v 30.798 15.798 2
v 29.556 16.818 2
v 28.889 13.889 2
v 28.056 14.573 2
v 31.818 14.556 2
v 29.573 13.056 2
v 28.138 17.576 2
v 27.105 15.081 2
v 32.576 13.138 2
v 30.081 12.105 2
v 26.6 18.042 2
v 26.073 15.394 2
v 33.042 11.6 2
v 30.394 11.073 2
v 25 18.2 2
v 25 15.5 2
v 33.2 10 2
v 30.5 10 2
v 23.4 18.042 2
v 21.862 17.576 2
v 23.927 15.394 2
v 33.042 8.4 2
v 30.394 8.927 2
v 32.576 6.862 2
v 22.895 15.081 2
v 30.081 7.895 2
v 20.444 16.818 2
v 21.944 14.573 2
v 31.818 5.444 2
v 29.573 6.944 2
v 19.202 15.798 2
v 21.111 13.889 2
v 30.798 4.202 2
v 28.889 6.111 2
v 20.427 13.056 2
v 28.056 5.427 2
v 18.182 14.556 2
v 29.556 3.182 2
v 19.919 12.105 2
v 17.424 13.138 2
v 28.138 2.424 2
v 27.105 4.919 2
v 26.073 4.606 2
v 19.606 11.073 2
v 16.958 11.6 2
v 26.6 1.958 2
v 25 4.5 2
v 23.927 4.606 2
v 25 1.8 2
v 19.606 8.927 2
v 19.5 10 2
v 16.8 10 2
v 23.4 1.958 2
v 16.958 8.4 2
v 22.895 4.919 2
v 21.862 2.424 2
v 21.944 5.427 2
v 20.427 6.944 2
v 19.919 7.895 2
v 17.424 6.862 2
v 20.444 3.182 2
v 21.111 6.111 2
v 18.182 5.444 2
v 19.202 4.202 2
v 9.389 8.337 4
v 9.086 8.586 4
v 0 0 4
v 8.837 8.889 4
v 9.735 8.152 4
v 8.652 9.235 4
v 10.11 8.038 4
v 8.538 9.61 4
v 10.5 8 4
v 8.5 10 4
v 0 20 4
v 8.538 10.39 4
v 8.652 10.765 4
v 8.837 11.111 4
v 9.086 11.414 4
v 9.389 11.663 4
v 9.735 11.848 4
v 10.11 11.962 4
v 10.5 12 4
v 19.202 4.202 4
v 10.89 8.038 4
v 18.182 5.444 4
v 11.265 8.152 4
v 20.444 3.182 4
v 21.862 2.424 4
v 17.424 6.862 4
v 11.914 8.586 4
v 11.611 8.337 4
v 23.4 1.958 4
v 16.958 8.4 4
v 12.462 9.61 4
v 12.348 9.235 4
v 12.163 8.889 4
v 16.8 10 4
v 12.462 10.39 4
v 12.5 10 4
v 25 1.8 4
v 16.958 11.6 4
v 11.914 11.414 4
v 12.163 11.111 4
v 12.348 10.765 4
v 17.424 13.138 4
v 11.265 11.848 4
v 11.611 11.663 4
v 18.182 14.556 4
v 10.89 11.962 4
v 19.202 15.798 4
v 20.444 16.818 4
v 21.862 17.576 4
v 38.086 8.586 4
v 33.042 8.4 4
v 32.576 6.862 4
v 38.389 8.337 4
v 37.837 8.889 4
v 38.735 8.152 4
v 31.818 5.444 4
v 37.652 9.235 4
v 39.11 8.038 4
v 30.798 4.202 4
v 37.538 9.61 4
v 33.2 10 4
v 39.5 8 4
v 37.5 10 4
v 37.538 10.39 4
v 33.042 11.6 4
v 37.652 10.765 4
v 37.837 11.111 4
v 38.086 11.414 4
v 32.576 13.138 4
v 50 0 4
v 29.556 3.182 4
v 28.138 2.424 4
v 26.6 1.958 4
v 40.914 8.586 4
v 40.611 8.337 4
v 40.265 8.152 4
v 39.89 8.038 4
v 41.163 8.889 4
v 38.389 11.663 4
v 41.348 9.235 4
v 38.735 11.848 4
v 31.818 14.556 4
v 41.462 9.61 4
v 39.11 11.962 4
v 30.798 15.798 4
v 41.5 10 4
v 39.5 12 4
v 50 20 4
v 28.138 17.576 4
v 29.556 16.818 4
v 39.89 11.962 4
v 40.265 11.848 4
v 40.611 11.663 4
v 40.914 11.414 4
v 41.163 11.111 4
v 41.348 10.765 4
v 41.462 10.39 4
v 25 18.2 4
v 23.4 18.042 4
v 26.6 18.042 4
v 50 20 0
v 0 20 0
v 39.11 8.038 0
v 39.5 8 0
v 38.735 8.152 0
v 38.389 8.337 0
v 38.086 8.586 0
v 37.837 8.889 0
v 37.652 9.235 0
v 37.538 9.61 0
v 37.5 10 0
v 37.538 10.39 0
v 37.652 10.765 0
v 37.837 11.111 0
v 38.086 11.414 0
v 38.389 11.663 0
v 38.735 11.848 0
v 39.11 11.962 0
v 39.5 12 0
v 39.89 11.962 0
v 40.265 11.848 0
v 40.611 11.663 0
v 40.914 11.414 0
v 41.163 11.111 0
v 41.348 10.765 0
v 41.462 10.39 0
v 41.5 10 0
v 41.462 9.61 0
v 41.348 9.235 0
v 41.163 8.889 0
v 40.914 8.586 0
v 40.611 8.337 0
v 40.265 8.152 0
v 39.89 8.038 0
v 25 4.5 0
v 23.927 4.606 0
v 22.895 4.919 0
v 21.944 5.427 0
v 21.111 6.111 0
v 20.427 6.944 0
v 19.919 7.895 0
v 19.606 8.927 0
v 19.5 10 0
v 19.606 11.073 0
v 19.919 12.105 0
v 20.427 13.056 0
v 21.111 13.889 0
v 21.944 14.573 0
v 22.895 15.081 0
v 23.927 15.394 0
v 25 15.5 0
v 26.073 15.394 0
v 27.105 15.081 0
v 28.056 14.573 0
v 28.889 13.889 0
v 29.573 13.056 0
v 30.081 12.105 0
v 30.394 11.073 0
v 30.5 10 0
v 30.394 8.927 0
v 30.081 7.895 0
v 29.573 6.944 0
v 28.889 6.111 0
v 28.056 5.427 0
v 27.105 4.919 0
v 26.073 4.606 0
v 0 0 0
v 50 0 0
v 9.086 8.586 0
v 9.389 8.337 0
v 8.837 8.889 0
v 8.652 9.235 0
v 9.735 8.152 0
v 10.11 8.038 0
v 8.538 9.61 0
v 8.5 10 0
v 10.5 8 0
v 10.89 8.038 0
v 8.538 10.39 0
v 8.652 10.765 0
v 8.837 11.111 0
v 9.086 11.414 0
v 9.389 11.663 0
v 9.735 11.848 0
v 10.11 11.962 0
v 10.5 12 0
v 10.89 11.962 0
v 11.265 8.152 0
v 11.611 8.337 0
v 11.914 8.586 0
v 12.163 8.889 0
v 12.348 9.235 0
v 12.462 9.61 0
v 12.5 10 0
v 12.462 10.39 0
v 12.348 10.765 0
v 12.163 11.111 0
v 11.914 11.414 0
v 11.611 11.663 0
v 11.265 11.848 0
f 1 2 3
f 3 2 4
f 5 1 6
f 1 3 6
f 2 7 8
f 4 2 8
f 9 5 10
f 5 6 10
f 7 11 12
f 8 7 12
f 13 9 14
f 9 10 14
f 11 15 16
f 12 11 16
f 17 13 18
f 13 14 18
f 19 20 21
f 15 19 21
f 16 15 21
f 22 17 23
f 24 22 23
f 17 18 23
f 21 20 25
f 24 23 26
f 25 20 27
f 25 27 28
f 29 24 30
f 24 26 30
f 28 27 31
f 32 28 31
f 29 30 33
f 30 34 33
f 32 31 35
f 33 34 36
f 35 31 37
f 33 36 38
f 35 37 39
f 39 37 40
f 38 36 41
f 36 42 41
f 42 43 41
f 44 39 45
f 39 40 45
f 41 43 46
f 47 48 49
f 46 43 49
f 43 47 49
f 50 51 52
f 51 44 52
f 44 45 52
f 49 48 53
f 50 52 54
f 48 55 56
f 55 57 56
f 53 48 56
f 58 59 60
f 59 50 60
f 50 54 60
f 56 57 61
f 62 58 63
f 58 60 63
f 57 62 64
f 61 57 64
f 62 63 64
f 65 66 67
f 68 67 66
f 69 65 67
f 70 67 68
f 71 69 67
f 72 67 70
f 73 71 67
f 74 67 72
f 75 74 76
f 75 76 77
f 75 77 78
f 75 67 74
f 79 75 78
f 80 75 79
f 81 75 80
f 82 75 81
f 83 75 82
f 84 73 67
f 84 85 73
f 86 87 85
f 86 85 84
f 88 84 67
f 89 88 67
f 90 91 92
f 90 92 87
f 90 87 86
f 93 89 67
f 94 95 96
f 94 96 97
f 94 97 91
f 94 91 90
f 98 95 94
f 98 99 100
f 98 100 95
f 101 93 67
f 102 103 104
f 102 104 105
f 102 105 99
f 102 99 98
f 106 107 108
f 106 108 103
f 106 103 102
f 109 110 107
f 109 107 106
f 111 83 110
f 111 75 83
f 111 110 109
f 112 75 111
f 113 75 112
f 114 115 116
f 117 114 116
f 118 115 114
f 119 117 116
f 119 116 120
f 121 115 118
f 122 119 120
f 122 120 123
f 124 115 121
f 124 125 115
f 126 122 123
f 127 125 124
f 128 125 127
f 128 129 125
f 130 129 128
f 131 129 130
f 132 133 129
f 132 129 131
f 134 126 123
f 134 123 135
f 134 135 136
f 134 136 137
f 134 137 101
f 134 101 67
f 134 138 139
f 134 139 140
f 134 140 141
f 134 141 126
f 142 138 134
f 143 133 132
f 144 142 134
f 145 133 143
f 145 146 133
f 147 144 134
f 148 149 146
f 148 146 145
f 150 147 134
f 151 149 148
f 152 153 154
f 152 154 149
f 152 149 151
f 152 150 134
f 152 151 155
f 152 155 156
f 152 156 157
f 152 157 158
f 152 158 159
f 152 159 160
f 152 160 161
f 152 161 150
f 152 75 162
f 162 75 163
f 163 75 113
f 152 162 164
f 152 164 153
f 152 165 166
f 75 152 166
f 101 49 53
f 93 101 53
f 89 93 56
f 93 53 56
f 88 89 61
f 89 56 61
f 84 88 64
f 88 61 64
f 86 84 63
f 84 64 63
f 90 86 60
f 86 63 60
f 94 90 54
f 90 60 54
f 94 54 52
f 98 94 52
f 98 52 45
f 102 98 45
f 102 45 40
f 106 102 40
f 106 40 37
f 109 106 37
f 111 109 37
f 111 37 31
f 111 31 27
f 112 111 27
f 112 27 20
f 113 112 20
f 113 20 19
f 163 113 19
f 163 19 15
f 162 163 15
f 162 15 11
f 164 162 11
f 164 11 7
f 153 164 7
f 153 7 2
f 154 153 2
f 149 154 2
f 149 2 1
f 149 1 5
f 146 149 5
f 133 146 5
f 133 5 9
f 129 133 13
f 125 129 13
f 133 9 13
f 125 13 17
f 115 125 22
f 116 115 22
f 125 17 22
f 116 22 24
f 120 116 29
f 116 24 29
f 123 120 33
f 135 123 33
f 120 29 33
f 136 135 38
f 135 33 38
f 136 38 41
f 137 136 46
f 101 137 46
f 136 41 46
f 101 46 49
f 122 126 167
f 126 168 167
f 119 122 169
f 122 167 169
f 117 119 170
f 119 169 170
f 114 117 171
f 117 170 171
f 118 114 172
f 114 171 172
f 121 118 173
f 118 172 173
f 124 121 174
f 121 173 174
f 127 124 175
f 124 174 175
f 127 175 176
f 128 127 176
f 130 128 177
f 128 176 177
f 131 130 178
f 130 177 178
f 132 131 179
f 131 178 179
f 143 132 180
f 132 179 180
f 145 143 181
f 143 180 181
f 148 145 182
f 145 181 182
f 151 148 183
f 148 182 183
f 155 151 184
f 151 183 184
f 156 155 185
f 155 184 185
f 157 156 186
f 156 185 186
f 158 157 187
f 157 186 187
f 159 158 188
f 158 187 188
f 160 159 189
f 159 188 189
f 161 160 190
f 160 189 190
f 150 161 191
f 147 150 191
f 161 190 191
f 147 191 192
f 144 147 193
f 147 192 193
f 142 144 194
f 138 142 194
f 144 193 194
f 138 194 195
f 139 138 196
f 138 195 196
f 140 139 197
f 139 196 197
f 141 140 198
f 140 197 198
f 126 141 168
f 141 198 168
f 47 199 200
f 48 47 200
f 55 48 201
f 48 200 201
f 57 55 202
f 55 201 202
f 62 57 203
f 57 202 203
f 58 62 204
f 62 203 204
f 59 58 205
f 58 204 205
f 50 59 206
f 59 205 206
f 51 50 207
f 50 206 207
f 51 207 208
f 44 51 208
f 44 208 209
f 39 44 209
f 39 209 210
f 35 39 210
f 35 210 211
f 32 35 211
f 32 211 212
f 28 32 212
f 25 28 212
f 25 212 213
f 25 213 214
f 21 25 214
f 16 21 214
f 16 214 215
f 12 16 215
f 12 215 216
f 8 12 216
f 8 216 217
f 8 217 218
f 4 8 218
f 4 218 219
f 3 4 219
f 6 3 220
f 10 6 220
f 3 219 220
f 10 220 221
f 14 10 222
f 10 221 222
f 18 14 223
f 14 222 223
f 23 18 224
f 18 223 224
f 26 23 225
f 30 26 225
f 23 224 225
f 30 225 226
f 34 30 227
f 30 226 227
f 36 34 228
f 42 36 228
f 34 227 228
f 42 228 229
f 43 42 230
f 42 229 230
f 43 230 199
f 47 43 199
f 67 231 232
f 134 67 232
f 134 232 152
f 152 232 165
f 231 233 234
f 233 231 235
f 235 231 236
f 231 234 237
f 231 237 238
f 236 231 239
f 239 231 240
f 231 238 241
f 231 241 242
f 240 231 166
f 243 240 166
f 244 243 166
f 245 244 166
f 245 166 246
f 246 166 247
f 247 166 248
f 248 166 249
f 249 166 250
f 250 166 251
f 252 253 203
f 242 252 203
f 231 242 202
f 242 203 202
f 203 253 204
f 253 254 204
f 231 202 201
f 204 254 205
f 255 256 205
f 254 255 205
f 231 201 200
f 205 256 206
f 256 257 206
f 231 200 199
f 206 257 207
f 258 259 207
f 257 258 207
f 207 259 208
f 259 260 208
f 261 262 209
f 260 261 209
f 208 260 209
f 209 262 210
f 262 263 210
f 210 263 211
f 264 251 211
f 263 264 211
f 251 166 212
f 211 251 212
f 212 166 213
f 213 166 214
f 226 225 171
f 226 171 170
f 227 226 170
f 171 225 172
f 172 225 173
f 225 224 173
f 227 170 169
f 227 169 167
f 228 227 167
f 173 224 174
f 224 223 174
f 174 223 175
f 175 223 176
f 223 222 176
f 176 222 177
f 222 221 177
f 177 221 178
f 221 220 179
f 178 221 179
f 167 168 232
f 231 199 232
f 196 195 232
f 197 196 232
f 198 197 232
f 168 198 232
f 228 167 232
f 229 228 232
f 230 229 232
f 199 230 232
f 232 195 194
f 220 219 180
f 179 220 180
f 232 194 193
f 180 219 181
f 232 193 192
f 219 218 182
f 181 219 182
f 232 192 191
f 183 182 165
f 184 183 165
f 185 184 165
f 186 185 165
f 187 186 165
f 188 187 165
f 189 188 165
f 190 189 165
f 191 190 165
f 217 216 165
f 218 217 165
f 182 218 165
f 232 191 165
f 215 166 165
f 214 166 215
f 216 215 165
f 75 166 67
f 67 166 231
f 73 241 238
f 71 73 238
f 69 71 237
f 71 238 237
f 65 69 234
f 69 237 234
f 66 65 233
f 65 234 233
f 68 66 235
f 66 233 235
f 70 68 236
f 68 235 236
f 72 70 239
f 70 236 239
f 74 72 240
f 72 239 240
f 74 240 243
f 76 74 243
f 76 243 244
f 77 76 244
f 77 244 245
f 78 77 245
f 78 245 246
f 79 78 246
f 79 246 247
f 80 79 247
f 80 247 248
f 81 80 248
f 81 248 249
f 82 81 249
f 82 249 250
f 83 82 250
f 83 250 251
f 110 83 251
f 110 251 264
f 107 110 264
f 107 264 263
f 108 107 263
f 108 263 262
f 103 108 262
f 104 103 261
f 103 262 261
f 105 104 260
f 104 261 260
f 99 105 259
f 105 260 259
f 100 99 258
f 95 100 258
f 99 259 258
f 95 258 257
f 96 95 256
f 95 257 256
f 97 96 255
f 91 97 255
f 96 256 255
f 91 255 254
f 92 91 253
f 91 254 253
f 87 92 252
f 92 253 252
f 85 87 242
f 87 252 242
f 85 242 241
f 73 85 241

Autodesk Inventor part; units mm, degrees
ref_plane "YZ Plane" through (0, 0, 0) normal (1, 0, 0) x (0, 1, 0)
ref_plane "XZ Plane" through (0, 0, 0) normal (0, 1, 0) x (-1, 0, 0)
ref_plane "XY Plane" through (0, 0, 0) normal (0, 0, 1) x (1, 0, 0)
sketch "Sketch1" plane through (0, 0, 0) normal (0, 0, 1) x (1, 0, 0)
  line L0 (0, 0) -> (50, 0)
  line L1 (50, 0) -> (50, 20)
  line L2 (50, 20) -> (0, 20)
  line L3 (0, 20) -> (0, 0)
  dimension "d0" = 50
  dimension "d1" = 20
extrude "Extrusion1" add sketch "Sketch1" along normal blind 4
sketch "Sketch2" plane through (0, 0, 4) normal (0, 0, 1) x (1, 0, 0)
  line L0 (50, 20) -> (0, 20) projected
  line L1 (0, 20) -> (0, 0) projected
  point P0 (25, 10)
  dimension "d11" = 10
  dimension "d12" = 25
hole "Hole1" at (25, 10, 4) direction (0, 0, -1) diameter 11 depth 4 tip angle 118 counterbore diameter 16.4 counterbore depth 2
sketch "Sketch3" plane through (0, 0, 4) normal (0, 0, 1) x (1, 0, 0)
  line L0 (50, 0) -> (50, 20) projected
  line L1 (50, 20) -> (0, 20) projected
  point P0 (0, 0)
  point P1 (39.5, 10)
  dimension "d21" = 10.5
  dimension "d22" = 10
hole "Hole2" at (39.5, 10, 4) direction (0, 0, -1) diameter 4 end through all
sketch "Sketch4" plane through (0, 0, 4) normal (0, 0, 1) x (1, 0, 0)
  line L0 (0, 0) -> (50, 0) projected
  line L1 (50, 0) -> (50, 20) projected
  point P0 (39.5, 5.9723)
  dimension "d30" = 5.9723
  dimension "d31" = 10.5
hole "Hole3" at (39.5, 5.9723, 4) direction (0, 0, -1) diameter 4 end through all
sketch "Sketch5" plane through (0, 0, 4) normal (0, 0, 1) x (1, 0, 0)
  line L0 (50, 20) -> (0, 20) projected
  line L1 (0, 20) -> (0, 0) projected
  point P0 (10.5, 10)
  dimension "d46" = 10
  dimension "d47" = 10.5
hole "Hole4" at (10.5, 10, 4) direction (0, 0, -1) diameter 4 end through all
sketch "Sketch6" plane through (0, 0, 4) normal (0, 0, 1) x (1, 0, 0)
  line L0 (0, 20) -> (0, 0) projected
  line L1 (0, 0) -> (50, 0) projected
  point P0 (10.5, 5.9723)
  dimension "d48" = 10.5
  dimension "d49" = 5.9723
hole "Hole5" at (10.5, 5.9723, 4) direction (0, 0, -1) diameter 4 end through all
delete faces "Delete Face1" heal yes whole lump no faces at (10.8208, 3.9982, 2.6667)
delete faces "Delete Face2" heal yes whole lump no faces at (40.1333, 4.0752, 2.6667)
properties part number "bottom"
